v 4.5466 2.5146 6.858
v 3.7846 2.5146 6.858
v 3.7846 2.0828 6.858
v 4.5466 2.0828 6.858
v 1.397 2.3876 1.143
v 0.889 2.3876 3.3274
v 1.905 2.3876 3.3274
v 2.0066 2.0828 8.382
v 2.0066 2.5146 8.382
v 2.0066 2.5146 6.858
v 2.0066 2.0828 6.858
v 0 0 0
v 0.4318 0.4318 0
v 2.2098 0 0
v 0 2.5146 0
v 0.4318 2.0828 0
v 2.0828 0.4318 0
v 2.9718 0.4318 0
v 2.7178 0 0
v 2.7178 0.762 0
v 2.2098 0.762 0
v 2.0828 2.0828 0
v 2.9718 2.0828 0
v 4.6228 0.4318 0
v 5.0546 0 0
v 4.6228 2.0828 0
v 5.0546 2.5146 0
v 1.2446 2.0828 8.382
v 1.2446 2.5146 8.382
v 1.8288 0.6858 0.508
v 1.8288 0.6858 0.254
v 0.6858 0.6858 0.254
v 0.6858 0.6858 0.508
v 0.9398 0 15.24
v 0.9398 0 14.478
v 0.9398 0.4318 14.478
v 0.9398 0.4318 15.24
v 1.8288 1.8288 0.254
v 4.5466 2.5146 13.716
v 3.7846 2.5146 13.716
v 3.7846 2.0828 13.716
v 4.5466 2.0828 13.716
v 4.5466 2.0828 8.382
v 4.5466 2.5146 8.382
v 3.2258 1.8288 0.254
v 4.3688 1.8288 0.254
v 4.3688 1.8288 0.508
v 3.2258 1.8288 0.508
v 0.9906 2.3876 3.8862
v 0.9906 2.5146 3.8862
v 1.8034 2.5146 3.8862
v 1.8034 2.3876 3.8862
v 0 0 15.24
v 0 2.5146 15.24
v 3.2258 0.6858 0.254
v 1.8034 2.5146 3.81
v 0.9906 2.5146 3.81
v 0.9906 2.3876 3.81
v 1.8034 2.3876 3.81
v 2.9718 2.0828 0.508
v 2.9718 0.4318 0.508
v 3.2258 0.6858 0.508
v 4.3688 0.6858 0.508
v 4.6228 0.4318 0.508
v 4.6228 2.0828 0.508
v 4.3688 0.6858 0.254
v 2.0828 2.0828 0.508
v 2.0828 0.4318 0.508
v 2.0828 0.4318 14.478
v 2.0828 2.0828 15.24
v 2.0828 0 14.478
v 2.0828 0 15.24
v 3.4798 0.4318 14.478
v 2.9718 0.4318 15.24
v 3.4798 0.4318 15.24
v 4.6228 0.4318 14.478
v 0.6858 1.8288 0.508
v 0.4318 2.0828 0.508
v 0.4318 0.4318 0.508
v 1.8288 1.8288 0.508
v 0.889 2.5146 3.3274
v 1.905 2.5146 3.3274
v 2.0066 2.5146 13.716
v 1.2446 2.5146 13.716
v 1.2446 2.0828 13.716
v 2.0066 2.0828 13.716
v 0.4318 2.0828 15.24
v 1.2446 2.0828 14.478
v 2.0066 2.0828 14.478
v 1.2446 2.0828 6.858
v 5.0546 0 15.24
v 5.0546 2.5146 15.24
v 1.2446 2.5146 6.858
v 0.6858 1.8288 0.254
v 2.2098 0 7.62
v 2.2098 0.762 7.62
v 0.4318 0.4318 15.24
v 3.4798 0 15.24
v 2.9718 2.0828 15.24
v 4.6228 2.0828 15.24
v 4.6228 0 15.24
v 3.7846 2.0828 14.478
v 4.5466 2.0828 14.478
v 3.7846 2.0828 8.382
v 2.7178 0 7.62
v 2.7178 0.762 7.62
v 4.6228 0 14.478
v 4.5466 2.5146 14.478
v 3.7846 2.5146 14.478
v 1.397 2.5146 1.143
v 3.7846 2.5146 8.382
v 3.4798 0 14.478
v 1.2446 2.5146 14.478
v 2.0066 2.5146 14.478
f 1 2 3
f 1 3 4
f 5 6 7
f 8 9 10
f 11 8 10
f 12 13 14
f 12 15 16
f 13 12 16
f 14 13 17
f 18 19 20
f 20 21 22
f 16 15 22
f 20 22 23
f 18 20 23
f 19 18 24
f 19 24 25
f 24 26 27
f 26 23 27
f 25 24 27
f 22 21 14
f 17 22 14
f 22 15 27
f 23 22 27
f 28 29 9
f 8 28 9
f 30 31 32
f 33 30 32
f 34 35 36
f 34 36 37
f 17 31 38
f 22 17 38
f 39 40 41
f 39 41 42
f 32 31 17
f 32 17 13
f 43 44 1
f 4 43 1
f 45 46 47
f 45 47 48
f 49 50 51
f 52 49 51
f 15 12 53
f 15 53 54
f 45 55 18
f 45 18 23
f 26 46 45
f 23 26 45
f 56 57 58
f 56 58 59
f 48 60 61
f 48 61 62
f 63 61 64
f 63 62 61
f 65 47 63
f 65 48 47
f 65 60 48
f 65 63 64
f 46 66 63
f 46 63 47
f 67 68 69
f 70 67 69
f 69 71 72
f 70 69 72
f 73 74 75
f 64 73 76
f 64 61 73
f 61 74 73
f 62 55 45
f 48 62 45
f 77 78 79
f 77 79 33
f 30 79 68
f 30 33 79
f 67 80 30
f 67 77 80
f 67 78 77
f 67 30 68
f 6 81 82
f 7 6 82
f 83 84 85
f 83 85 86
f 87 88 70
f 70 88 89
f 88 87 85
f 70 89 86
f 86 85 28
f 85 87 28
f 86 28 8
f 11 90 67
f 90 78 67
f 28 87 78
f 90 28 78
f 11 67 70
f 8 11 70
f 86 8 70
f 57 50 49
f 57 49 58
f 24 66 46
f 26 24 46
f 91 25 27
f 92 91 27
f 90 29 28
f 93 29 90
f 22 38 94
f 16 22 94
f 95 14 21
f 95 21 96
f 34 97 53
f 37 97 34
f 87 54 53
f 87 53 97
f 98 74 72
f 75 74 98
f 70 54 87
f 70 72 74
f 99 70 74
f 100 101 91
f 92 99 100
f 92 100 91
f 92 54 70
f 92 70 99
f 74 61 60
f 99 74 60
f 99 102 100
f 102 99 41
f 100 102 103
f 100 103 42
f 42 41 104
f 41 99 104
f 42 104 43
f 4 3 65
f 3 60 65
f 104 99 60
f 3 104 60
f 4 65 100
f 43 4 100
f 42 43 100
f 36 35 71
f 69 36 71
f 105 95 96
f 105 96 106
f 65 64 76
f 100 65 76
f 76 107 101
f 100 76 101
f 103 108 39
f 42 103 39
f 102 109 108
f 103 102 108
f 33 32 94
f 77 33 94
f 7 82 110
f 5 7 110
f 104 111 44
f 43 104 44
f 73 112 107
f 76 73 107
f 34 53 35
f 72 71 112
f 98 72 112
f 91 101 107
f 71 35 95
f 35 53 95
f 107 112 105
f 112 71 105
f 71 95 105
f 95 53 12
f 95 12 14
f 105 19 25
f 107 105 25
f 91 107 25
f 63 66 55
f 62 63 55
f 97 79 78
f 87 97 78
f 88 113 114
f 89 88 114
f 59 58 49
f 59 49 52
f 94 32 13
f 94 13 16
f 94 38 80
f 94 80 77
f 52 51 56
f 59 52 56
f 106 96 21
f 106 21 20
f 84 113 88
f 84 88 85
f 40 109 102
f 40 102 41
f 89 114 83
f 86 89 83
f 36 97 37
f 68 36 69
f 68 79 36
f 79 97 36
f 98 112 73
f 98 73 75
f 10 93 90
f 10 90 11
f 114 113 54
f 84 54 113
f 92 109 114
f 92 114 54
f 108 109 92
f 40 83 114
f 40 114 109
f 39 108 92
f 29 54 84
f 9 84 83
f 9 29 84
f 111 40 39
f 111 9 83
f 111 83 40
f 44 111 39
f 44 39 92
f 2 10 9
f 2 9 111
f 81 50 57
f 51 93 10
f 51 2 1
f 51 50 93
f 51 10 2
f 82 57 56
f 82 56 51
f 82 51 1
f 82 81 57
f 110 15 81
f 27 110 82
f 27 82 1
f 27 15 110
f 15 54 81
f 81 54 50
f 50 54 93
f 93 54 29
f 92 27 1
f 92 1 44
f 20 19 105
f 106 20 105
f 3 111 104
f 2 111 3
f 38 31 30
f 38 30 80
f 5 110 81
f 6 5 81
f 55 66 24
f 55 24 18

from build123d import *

# Parameters (mm, degrees)
SKETCH1_W           = 5.0546
SKETCH1_H           = 2.5146
BOSS_EXTRUDE1_DEPTH = 15.24
SKETCH2_W           = 1.143
SKETCH2_H           = 1.143
CUT_EXTRUDE1_DEPTH  = 16.24
CHAMFER1_SIZE       = 0.254
SKETCH3_W           = 0.762
SKETCH3_H           = 0.762
SKETCH3_H_2         = 1.524
CUT_EXTRUDE2_DEPTH  = 1.27
SKETCH4_W           = 1.651
SKETCH4_H           = 1.651
CUT_EXTRUDE3_DEPTH  = 15.732
SKETCH6_W           = 1.143
SKETCH6_H           = 0.762
CUT_EXTRUDE5_DEPTH  = 0.4318
SKETCH7_W           = 0.508
SKETCH7_H           = 7.62
CUT_EXTRUDE6_DEPTH  = 0.762
SKETCH8_W           = 0.8128
SKETCH8_H           = 0.0762
CUT_EXTRUDE7_DEPTH  = 0.127


with BuildPart() as part:
    # Sketch1 → Boss-Extrude1 (new body)
    with BuildSketch(Plane.XY):
        with Locations((2.5273, 1.2573)):
            Rectangle(SKETCH1_W, SKETCH1_H)
    extrude(amount=BOSS_EXTRUDE1_DEPTH)

    # Sketch2 → Cut-Extrude1 (cut, through all)
    with BuildSketch(Plane(origin=(0, 0, 0), x_dir=(-1, 0, 0), z_dir=(0, 0, -1))):
        with Locations((-3.7973, 1.2573)):
            Rectangle(SKETCH2_W, SKETCH2_H)
        with Locations((-1.2573, 1.2573)):
            Rectangle(SKETCH2_W, SKETCH2_H)
    extrude(amount=-CUT_EXTRUDE1_DEPTH, mode=Mode.SUBTRACT)

    # Chamfer1
    chamfer1_edges = [part.edges().sort_by_distance(p)[0] for p in [
        (4.3688, 1.2573, 0),
        (3.7973, 0.6858, 0),
        (3.2258, 1.2573, 0),
        (3.7973, 1.8288, 0),
        (1.8288, 1.2573, 0),
        (1.2573, 0.6858, 0),
        (0.6858, 1.2573, 0),
        (1.2573, 1.8288, 0),
    ]]
    chamfer(chamfer1_edges, length=CHAMFER1_SIZE)

    # Sketch3 → Cut-Extrude2 (cut)
    with BuildSketch(Plane(origin=(0, 2.5146, 0), x_dir=(1, 0, 0), z_dir=(0, 1, 0))):
        with Locations((4.1656, -14.097)):
            Rectangle(SKETCH3_W, SKETCH3_H)
        with Locations((1.6256, -14.097)):
            Rectangle(SKETCH3_W, SKETCH3_H)
        with Locations((4.1656, -7.62)):
            Rectangle(SKETCH3_W, SKETCH3_H_2)
        with Locations((1.6256, -7.62)):
            Rectangle(SKETCH3_W, SKETCH3_H_2)
    extrude(amount=-CUT_EXTRUDE2_DEPTH, mode=Mode.SUBTRACT)

    # Sketch4 → Cut-Extrude3 (cut, through all)
    with BuildSketch(Plane.XY.offset(0.508)):
        with Locations((1.2573, 1.2573)):
            Rectangle(SKETCH4_W, SKETCH4_H)
        with Locations((3.7973, 1.2573)):
            Rectangle(SKETCH4_W, SKETCH4_H)
    extrude(amount=CUT_EXTRUDE3_DEPTH, mode=Mode.SUBTRACT)

    # Sketch6 → Cut-Extrude5 (cut)
    with BuildSketch(Plane.XZ):
        with Locations((1.5113, 14.859)):
            Rectangle(SKETCH6_W, SKETCH6_H)
        with Locations((4.0513, 14.859)):
            Rectangle(SKETCH6_W, SKETCH6_H)
    extrude(amount=-CUT_EXTRUDE5_DEPTH, mode=Mode.SUBTRACT)

    # Sketch7 → Cut-Extrude6 (cut)
    with BuildSketch(Plane.XZ):
        with Locations((2.4638, 3.81)):
            Rectangle(SKETCH7_W, SKETCH7_H)
    extrude(amount=-CUT_EXTRUDE6_DEPTH, mode=Mode.SUBTRACT)

    # Sketch8 → Cut-Extrude7 (cut)
    with BuildSketch(Plane(origin=(0, 2.5146, 0), x_dir=(1, 0, 0), z_dir=(0, 1, 0))):
        Polygon((1.397, -1.143), (0.889, -3.3274), (1.905, -3.3274), align=None)
        with Locations((1.397, -3.8481)):
            Rectangle(SKETCH8_W, SKETCH8_H)
    extrude(amount=-CUT_EXTRUDE7_DEPTH, mode=Mode.SUBTRACT)


solid = part.part
